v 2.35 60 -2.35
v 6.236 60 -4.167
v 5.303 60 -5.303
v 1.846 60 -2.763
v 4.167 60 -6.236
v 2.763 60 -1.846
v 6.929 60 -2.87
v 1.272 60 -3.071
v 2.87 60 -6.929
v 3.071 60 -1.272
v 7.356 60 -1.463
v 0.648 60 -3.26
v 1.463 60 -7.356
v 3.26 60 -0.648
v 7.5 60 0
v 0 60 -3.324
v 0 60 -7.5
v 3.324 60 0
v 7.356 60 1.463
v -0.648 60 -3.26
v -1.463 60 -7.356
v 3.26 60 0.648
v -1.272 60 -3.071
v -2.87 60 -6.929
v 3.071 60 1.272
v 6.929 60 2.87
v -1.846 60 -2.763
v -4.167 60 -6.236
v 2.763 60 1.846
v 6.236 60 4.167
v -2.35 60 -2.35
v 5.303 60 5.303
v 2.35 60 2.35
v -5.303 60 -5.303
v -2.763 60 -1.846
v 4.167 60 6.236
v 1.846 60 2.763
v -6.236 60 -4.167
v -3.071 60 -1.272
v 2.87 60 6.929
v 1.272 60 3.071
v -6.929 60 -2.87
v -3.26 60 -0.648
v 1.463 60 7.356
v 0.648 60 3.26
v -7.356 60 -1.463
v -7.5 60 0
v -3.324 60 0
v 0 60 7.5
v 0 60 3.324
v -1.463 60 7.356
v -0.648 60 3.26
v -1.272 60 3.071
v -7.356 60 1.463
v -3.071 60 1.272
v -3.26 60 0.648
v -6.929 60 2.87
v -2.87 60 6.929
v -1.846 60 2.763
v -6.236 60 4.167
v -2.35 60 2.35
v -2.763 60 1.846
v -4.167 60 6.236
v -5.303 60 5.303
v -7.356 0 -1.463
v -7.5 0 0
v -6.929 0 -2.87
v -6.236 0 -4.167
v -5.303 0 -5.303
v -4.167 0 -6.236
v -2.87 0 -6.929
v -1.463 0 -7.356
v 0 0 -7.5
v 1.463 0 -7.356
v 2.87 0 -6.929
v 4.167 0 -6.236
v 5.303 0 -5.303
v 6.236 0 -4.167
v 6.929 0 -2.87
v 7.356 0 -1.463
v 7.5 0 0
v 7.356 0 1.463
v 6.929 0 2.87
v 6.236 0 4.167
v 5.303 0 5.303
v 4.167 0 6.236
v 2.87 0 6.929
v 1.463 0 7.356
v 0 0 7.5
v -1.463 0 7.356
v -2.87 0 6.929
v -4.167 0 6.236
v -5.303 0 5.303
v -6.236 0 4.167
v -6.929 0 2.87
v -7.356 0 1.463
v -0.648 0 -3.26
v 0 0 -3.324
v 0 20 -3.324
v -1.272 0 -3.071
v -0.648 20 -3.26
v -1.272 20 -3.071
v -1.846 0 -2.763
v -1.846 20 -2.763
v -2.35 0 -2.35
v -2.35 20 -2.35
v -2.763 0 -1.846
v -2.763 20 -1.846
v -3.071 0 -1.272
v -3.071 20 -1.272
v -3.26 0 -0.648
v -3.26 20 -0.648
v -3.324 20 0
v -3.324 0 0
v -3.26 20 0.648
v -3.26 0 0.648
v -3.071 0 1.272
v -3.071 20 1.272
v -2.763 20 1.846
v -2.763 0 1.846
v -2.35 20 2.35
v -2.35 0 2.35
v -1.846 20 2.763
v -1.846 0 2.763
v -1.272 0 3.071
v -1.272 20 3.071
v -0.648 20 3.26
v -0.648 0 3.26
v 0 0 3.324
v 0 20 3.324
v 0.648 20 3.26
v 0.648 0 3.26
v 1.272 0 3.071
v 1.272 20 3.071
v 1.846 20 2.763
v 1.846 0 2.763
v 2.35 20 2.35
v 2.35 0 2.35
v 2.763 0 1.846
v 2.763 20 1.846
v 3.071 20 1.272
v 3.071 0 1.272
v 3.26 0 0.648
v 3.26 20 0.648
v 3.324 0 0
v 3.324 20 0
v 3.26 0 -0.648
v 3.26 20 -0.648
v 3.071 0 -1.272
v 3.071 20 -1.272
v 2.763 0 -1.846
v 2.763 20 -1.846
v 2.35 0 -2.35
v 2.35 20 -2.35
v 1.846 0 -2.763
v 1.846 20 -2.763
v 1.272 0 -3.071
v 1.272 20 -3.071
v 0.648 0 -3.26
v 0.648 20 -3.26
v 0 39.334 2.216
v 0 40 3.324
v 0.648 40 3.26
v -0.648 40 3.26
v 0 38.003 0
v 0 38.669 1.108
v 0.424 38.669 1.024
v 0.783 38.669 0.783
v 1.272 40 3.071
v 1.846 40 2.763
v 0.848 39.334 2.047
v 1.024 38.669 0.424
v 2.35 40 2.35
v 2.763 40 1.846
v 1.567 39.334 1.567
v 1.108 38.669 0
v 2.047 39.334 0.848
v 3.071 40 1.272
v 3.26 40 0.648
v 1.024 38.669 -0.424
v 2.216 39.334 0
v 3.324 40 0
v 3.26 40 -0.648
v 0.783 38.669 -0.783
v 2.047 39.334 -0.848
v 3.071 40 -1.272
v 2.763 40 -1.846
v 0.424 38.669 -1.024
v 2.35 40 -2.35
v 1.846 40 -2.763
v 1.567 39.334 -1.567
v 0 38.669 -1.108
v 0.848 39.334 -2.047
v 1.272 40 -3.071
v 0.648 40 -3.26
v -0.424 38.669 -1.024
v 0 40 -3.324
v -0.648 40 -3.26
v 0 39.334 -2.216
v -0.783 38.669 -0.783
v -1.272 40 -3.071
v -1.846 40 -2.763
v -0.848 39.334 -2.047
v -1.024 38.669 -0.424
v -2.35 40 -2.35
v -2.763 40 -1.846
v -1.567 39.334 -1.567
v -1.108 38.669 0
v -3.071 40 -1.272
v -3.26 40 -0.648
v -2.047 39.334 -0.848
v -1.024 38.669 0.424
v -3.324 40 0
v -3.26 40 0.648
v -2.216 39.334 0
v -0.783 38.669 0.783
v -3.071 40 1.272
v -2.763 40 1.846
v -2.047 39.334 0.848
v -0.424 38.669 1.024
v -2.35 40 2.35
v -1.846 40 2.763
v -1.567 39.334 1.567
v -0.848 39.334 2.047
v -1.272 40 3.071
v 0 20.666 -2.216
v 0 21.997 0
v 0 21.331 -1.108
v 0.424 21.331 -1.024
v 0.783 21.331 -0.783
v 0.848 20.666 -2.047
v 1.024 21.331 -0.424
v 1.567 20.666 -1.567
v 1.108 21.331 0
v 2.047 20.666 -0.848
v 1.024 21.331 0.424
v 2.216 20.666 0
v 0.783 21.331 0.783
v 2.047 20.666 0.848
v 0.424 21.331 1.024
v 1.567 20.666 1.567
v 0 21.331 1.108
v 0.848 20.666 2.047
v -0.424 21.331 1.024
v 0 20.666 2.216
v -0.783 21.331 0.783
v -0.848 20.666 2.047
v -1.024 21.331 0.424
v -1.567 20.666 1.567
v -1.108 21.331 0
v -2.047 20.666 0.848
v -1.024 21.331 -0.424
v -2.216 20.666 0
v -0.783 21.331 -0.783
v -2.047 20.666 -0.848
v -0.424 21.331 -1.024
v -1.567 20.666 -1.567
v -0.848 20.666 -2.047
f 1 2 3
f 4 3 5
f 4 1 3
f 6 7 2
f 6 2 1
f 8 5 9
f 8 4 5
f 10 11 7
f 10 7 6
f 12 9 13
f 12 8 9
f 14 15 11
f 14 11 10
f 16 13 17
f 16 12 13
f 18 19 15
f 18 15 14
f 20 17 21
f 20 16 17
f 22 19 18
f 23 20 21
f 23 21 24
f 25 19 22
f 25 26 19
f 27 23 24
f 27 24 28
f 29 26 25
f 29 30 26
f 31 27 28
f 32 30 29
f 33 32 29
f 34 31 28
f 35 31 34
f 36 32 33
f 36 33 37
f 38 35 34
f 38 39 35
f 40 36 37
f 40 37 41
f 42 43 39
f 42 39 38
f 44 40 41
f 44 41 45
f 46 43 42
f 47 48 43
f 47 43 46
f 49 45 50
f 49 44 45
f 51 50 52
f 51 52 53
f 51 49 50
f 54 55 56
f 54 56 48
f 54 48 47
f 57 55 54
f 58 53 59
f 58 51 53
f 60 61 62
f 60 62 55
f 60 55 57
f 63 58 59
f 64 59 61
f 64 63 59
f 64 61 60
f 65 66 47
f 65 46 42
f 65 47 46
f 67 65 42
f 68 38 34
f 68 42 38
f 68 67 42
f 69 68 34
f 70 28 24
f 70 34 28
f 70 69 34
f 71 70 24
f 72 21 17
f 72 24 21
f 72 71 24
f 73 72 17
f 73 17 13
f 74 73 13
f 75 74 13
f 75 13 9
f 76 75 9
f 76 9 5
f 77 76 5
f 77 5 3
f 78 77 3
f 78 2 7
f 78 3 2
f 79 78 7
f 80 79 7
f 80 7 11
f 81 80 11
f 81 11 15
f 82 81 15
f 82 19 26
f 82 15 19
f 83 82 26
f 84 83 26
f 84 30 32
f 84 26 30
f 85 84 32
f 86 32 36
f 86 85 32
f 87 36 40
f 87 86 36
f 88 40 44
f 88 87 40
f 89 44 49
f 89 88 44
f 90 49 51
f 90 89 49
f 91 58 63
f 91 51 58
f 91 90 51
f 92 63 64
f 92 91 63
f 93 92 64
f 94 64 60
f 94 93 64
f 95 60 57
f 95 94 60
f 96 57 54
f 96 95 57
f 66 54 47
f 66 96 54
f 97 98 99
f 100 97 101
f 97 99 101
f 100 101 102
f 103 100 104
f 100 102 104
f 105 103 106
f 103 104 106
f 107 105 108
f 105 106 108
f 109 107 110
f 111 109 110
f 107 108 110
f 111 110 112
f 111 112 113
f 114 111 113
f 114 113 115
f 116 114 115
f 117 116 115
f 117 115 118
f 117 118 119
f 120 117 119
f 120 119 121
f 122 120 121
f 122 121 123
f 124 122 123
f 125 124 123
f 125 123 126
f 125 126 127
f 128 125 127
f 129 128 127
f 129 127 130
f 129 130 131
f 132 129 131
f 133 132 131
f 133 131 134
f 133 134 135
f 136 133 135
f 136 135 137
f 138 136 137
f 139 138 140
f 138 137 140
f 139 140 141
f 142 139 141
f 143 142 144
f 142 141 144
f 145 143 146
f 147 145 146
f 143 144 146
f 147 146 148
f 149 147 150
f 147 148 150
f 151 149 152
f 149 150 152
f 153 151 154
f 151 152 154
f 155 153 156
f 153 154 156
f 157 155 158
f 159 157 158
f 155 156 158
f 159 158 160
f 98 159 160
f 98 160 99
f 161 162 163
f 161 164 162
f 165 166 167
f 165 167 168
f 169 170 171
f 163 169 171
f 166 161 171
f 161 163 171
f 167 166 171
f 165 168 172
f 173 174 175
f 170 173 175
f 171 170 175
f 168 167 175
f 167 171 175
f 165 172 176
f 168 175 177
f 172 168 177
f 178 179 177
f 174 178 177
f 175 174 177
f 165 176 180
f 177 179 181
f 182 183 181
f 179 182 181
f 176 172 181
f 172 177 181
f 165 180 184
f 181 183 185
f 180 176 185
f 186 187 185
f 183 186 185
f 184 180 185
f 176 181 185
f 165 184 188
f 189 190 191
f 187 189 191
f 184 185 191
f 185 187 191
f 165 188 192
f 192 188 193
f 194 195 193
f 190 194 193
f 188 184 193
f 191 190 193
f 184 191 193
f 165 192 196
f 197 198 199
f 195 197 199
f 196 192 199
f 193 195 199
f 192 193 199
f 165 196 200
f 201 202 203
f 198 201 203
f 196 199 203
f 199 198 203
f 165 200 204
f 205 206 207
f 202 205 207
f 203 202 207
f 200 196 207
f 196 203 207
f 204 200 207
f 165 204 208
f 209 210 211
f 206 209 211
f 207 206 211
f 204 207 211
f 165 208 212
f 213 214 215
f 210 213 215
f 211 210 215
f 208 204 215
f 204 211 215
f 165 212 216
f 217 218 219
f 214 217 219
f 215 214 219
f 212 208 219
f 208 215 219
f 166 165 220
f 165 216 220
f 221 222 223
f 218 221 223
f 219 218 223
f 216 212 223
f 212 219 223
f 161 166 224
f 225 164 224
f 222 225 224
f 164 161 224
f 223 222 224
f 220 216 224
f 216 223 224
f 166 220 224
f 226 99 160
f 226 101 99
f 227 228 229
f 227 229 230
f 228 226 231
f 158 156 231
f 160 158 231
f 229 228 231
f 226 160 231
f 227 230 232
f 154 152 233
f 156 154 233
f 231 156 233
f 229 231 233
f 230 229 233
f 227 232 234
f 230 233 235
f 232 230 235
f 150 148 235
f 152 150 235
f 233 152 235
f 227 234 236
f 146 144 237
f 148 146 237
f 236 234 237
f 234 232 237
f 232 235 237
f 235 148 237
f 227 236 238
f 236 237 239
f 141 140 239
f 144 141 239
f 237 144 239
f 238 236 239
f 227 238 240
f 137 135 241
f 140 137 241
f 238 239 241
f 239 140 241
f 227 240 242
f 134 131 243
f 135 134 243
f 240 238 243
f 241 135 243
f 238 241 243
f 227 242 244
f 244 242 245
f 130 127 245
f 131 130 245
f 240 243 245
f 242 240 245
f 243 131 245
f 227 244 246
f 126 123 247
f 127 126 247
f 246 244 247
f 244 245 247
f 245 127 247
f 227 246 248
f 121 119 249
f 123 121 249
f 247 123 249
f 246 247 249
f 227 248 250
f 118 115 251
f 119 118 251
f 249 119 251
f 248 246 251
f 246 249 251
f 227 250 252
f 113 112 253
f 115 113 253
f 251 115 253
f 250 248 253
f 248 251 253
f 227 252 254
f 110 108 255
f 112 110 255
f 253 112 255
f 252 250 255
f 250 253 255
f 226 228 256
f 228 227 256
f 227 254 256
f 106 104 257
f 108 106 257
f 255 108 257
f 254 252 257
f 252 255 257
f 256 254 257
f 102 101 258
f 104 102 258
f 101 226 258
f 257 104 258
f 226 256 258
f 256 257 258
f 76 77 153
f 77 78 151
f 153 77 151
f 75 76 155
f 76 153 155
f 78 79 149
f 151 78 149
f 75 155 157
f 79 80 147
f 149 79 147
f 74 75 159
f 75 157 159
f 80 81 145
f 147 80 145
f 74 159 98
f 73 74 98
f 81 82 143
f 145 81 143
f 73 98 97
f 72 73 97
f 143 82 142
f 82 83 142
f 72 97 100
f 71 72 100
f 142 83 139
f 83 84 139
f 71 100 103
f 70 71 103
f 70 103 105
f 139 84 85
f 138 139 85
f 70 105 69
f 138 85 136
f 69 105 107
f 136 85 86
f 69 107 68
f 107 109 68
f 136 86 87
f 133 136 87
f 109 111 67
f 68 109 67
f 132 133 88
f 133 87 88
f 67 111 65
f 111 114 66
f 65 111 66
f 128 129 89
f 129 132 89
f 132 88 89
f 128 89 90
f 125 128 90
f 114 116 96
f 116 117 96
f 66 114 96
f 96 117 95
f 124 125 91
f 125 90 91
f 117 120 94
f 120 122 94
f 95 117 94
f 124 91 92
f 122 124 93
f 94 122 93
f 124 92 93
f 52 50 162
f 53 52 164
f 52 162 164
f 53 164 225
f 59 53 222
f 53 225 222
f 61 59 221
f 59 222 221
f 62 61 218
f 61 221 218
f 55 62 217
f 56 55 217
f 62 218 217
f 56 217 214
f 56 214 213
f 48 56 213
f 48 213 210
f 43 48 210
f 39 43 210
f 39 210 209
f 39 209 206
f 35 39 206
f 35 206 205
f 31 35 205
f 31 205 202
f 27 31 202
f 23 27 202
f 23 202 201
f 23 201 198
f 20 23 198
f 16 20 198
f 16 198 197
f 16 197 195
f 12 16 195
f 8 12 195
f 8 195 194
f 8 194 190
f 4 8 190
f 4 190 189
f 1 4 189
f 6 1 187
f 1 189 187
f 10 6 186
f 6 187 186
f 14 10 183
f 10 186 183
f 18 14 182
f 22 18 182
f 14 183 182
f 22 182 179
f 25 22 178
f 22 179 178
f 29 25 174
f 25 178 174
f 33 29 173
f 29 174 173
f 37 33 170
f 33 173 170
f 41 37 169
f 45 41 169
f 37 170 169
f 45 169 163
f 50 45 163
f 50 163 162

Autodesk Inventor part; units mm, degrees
ref_plane "YZ Plane" through (0, 0, 0) normal (1, 0, 0) x (0, 1, 0)
ref_plane "XZ Plane" through (0, 0, 0) normal (0, 1, 0) x (-1, 0, 0)
ref_plane "XY Plane" through (0, 0, 0) normal (0, 0, 1) x (1, 0, 0)
sketch "Sketch1" plane through (0, 0, 0) normal (0, 1, 0) x (-1, 0, 0)
  circle A0 centre (0, 0) radius 7.5
  dimension "d0" = 15
extrude "Extrusion1" add sketch "Sketch1" along normal blind 60
sketch "Sketch2" plane through (0, 60, 0) normal (0, 1, 0) x (1, 0, 0)
  circle A0 centre (0, 0) radius 7.5 projected
sketch "Sketch3" plane through (0, 0, 0) normal (0, -1, 0) x (1, 0, 0)
  point P0 (0, 0)
  point P1 (0, 0)
hole "Hole1" at (0, 60, 0) direction (0, -1, 0) diameter 6.647 depth 20 tip angle 118 thread size "M8x1.25" class "6H" standard "ISO Metric profile"
hole "Hole2" at (0, 0, 0) direction (0, 1, 0) diameter 6.647 depth 20 tip angle 118 thread size "M8x1.25" class "6H" standard "ISO Metric profile"
properties part number "Support_bar"
